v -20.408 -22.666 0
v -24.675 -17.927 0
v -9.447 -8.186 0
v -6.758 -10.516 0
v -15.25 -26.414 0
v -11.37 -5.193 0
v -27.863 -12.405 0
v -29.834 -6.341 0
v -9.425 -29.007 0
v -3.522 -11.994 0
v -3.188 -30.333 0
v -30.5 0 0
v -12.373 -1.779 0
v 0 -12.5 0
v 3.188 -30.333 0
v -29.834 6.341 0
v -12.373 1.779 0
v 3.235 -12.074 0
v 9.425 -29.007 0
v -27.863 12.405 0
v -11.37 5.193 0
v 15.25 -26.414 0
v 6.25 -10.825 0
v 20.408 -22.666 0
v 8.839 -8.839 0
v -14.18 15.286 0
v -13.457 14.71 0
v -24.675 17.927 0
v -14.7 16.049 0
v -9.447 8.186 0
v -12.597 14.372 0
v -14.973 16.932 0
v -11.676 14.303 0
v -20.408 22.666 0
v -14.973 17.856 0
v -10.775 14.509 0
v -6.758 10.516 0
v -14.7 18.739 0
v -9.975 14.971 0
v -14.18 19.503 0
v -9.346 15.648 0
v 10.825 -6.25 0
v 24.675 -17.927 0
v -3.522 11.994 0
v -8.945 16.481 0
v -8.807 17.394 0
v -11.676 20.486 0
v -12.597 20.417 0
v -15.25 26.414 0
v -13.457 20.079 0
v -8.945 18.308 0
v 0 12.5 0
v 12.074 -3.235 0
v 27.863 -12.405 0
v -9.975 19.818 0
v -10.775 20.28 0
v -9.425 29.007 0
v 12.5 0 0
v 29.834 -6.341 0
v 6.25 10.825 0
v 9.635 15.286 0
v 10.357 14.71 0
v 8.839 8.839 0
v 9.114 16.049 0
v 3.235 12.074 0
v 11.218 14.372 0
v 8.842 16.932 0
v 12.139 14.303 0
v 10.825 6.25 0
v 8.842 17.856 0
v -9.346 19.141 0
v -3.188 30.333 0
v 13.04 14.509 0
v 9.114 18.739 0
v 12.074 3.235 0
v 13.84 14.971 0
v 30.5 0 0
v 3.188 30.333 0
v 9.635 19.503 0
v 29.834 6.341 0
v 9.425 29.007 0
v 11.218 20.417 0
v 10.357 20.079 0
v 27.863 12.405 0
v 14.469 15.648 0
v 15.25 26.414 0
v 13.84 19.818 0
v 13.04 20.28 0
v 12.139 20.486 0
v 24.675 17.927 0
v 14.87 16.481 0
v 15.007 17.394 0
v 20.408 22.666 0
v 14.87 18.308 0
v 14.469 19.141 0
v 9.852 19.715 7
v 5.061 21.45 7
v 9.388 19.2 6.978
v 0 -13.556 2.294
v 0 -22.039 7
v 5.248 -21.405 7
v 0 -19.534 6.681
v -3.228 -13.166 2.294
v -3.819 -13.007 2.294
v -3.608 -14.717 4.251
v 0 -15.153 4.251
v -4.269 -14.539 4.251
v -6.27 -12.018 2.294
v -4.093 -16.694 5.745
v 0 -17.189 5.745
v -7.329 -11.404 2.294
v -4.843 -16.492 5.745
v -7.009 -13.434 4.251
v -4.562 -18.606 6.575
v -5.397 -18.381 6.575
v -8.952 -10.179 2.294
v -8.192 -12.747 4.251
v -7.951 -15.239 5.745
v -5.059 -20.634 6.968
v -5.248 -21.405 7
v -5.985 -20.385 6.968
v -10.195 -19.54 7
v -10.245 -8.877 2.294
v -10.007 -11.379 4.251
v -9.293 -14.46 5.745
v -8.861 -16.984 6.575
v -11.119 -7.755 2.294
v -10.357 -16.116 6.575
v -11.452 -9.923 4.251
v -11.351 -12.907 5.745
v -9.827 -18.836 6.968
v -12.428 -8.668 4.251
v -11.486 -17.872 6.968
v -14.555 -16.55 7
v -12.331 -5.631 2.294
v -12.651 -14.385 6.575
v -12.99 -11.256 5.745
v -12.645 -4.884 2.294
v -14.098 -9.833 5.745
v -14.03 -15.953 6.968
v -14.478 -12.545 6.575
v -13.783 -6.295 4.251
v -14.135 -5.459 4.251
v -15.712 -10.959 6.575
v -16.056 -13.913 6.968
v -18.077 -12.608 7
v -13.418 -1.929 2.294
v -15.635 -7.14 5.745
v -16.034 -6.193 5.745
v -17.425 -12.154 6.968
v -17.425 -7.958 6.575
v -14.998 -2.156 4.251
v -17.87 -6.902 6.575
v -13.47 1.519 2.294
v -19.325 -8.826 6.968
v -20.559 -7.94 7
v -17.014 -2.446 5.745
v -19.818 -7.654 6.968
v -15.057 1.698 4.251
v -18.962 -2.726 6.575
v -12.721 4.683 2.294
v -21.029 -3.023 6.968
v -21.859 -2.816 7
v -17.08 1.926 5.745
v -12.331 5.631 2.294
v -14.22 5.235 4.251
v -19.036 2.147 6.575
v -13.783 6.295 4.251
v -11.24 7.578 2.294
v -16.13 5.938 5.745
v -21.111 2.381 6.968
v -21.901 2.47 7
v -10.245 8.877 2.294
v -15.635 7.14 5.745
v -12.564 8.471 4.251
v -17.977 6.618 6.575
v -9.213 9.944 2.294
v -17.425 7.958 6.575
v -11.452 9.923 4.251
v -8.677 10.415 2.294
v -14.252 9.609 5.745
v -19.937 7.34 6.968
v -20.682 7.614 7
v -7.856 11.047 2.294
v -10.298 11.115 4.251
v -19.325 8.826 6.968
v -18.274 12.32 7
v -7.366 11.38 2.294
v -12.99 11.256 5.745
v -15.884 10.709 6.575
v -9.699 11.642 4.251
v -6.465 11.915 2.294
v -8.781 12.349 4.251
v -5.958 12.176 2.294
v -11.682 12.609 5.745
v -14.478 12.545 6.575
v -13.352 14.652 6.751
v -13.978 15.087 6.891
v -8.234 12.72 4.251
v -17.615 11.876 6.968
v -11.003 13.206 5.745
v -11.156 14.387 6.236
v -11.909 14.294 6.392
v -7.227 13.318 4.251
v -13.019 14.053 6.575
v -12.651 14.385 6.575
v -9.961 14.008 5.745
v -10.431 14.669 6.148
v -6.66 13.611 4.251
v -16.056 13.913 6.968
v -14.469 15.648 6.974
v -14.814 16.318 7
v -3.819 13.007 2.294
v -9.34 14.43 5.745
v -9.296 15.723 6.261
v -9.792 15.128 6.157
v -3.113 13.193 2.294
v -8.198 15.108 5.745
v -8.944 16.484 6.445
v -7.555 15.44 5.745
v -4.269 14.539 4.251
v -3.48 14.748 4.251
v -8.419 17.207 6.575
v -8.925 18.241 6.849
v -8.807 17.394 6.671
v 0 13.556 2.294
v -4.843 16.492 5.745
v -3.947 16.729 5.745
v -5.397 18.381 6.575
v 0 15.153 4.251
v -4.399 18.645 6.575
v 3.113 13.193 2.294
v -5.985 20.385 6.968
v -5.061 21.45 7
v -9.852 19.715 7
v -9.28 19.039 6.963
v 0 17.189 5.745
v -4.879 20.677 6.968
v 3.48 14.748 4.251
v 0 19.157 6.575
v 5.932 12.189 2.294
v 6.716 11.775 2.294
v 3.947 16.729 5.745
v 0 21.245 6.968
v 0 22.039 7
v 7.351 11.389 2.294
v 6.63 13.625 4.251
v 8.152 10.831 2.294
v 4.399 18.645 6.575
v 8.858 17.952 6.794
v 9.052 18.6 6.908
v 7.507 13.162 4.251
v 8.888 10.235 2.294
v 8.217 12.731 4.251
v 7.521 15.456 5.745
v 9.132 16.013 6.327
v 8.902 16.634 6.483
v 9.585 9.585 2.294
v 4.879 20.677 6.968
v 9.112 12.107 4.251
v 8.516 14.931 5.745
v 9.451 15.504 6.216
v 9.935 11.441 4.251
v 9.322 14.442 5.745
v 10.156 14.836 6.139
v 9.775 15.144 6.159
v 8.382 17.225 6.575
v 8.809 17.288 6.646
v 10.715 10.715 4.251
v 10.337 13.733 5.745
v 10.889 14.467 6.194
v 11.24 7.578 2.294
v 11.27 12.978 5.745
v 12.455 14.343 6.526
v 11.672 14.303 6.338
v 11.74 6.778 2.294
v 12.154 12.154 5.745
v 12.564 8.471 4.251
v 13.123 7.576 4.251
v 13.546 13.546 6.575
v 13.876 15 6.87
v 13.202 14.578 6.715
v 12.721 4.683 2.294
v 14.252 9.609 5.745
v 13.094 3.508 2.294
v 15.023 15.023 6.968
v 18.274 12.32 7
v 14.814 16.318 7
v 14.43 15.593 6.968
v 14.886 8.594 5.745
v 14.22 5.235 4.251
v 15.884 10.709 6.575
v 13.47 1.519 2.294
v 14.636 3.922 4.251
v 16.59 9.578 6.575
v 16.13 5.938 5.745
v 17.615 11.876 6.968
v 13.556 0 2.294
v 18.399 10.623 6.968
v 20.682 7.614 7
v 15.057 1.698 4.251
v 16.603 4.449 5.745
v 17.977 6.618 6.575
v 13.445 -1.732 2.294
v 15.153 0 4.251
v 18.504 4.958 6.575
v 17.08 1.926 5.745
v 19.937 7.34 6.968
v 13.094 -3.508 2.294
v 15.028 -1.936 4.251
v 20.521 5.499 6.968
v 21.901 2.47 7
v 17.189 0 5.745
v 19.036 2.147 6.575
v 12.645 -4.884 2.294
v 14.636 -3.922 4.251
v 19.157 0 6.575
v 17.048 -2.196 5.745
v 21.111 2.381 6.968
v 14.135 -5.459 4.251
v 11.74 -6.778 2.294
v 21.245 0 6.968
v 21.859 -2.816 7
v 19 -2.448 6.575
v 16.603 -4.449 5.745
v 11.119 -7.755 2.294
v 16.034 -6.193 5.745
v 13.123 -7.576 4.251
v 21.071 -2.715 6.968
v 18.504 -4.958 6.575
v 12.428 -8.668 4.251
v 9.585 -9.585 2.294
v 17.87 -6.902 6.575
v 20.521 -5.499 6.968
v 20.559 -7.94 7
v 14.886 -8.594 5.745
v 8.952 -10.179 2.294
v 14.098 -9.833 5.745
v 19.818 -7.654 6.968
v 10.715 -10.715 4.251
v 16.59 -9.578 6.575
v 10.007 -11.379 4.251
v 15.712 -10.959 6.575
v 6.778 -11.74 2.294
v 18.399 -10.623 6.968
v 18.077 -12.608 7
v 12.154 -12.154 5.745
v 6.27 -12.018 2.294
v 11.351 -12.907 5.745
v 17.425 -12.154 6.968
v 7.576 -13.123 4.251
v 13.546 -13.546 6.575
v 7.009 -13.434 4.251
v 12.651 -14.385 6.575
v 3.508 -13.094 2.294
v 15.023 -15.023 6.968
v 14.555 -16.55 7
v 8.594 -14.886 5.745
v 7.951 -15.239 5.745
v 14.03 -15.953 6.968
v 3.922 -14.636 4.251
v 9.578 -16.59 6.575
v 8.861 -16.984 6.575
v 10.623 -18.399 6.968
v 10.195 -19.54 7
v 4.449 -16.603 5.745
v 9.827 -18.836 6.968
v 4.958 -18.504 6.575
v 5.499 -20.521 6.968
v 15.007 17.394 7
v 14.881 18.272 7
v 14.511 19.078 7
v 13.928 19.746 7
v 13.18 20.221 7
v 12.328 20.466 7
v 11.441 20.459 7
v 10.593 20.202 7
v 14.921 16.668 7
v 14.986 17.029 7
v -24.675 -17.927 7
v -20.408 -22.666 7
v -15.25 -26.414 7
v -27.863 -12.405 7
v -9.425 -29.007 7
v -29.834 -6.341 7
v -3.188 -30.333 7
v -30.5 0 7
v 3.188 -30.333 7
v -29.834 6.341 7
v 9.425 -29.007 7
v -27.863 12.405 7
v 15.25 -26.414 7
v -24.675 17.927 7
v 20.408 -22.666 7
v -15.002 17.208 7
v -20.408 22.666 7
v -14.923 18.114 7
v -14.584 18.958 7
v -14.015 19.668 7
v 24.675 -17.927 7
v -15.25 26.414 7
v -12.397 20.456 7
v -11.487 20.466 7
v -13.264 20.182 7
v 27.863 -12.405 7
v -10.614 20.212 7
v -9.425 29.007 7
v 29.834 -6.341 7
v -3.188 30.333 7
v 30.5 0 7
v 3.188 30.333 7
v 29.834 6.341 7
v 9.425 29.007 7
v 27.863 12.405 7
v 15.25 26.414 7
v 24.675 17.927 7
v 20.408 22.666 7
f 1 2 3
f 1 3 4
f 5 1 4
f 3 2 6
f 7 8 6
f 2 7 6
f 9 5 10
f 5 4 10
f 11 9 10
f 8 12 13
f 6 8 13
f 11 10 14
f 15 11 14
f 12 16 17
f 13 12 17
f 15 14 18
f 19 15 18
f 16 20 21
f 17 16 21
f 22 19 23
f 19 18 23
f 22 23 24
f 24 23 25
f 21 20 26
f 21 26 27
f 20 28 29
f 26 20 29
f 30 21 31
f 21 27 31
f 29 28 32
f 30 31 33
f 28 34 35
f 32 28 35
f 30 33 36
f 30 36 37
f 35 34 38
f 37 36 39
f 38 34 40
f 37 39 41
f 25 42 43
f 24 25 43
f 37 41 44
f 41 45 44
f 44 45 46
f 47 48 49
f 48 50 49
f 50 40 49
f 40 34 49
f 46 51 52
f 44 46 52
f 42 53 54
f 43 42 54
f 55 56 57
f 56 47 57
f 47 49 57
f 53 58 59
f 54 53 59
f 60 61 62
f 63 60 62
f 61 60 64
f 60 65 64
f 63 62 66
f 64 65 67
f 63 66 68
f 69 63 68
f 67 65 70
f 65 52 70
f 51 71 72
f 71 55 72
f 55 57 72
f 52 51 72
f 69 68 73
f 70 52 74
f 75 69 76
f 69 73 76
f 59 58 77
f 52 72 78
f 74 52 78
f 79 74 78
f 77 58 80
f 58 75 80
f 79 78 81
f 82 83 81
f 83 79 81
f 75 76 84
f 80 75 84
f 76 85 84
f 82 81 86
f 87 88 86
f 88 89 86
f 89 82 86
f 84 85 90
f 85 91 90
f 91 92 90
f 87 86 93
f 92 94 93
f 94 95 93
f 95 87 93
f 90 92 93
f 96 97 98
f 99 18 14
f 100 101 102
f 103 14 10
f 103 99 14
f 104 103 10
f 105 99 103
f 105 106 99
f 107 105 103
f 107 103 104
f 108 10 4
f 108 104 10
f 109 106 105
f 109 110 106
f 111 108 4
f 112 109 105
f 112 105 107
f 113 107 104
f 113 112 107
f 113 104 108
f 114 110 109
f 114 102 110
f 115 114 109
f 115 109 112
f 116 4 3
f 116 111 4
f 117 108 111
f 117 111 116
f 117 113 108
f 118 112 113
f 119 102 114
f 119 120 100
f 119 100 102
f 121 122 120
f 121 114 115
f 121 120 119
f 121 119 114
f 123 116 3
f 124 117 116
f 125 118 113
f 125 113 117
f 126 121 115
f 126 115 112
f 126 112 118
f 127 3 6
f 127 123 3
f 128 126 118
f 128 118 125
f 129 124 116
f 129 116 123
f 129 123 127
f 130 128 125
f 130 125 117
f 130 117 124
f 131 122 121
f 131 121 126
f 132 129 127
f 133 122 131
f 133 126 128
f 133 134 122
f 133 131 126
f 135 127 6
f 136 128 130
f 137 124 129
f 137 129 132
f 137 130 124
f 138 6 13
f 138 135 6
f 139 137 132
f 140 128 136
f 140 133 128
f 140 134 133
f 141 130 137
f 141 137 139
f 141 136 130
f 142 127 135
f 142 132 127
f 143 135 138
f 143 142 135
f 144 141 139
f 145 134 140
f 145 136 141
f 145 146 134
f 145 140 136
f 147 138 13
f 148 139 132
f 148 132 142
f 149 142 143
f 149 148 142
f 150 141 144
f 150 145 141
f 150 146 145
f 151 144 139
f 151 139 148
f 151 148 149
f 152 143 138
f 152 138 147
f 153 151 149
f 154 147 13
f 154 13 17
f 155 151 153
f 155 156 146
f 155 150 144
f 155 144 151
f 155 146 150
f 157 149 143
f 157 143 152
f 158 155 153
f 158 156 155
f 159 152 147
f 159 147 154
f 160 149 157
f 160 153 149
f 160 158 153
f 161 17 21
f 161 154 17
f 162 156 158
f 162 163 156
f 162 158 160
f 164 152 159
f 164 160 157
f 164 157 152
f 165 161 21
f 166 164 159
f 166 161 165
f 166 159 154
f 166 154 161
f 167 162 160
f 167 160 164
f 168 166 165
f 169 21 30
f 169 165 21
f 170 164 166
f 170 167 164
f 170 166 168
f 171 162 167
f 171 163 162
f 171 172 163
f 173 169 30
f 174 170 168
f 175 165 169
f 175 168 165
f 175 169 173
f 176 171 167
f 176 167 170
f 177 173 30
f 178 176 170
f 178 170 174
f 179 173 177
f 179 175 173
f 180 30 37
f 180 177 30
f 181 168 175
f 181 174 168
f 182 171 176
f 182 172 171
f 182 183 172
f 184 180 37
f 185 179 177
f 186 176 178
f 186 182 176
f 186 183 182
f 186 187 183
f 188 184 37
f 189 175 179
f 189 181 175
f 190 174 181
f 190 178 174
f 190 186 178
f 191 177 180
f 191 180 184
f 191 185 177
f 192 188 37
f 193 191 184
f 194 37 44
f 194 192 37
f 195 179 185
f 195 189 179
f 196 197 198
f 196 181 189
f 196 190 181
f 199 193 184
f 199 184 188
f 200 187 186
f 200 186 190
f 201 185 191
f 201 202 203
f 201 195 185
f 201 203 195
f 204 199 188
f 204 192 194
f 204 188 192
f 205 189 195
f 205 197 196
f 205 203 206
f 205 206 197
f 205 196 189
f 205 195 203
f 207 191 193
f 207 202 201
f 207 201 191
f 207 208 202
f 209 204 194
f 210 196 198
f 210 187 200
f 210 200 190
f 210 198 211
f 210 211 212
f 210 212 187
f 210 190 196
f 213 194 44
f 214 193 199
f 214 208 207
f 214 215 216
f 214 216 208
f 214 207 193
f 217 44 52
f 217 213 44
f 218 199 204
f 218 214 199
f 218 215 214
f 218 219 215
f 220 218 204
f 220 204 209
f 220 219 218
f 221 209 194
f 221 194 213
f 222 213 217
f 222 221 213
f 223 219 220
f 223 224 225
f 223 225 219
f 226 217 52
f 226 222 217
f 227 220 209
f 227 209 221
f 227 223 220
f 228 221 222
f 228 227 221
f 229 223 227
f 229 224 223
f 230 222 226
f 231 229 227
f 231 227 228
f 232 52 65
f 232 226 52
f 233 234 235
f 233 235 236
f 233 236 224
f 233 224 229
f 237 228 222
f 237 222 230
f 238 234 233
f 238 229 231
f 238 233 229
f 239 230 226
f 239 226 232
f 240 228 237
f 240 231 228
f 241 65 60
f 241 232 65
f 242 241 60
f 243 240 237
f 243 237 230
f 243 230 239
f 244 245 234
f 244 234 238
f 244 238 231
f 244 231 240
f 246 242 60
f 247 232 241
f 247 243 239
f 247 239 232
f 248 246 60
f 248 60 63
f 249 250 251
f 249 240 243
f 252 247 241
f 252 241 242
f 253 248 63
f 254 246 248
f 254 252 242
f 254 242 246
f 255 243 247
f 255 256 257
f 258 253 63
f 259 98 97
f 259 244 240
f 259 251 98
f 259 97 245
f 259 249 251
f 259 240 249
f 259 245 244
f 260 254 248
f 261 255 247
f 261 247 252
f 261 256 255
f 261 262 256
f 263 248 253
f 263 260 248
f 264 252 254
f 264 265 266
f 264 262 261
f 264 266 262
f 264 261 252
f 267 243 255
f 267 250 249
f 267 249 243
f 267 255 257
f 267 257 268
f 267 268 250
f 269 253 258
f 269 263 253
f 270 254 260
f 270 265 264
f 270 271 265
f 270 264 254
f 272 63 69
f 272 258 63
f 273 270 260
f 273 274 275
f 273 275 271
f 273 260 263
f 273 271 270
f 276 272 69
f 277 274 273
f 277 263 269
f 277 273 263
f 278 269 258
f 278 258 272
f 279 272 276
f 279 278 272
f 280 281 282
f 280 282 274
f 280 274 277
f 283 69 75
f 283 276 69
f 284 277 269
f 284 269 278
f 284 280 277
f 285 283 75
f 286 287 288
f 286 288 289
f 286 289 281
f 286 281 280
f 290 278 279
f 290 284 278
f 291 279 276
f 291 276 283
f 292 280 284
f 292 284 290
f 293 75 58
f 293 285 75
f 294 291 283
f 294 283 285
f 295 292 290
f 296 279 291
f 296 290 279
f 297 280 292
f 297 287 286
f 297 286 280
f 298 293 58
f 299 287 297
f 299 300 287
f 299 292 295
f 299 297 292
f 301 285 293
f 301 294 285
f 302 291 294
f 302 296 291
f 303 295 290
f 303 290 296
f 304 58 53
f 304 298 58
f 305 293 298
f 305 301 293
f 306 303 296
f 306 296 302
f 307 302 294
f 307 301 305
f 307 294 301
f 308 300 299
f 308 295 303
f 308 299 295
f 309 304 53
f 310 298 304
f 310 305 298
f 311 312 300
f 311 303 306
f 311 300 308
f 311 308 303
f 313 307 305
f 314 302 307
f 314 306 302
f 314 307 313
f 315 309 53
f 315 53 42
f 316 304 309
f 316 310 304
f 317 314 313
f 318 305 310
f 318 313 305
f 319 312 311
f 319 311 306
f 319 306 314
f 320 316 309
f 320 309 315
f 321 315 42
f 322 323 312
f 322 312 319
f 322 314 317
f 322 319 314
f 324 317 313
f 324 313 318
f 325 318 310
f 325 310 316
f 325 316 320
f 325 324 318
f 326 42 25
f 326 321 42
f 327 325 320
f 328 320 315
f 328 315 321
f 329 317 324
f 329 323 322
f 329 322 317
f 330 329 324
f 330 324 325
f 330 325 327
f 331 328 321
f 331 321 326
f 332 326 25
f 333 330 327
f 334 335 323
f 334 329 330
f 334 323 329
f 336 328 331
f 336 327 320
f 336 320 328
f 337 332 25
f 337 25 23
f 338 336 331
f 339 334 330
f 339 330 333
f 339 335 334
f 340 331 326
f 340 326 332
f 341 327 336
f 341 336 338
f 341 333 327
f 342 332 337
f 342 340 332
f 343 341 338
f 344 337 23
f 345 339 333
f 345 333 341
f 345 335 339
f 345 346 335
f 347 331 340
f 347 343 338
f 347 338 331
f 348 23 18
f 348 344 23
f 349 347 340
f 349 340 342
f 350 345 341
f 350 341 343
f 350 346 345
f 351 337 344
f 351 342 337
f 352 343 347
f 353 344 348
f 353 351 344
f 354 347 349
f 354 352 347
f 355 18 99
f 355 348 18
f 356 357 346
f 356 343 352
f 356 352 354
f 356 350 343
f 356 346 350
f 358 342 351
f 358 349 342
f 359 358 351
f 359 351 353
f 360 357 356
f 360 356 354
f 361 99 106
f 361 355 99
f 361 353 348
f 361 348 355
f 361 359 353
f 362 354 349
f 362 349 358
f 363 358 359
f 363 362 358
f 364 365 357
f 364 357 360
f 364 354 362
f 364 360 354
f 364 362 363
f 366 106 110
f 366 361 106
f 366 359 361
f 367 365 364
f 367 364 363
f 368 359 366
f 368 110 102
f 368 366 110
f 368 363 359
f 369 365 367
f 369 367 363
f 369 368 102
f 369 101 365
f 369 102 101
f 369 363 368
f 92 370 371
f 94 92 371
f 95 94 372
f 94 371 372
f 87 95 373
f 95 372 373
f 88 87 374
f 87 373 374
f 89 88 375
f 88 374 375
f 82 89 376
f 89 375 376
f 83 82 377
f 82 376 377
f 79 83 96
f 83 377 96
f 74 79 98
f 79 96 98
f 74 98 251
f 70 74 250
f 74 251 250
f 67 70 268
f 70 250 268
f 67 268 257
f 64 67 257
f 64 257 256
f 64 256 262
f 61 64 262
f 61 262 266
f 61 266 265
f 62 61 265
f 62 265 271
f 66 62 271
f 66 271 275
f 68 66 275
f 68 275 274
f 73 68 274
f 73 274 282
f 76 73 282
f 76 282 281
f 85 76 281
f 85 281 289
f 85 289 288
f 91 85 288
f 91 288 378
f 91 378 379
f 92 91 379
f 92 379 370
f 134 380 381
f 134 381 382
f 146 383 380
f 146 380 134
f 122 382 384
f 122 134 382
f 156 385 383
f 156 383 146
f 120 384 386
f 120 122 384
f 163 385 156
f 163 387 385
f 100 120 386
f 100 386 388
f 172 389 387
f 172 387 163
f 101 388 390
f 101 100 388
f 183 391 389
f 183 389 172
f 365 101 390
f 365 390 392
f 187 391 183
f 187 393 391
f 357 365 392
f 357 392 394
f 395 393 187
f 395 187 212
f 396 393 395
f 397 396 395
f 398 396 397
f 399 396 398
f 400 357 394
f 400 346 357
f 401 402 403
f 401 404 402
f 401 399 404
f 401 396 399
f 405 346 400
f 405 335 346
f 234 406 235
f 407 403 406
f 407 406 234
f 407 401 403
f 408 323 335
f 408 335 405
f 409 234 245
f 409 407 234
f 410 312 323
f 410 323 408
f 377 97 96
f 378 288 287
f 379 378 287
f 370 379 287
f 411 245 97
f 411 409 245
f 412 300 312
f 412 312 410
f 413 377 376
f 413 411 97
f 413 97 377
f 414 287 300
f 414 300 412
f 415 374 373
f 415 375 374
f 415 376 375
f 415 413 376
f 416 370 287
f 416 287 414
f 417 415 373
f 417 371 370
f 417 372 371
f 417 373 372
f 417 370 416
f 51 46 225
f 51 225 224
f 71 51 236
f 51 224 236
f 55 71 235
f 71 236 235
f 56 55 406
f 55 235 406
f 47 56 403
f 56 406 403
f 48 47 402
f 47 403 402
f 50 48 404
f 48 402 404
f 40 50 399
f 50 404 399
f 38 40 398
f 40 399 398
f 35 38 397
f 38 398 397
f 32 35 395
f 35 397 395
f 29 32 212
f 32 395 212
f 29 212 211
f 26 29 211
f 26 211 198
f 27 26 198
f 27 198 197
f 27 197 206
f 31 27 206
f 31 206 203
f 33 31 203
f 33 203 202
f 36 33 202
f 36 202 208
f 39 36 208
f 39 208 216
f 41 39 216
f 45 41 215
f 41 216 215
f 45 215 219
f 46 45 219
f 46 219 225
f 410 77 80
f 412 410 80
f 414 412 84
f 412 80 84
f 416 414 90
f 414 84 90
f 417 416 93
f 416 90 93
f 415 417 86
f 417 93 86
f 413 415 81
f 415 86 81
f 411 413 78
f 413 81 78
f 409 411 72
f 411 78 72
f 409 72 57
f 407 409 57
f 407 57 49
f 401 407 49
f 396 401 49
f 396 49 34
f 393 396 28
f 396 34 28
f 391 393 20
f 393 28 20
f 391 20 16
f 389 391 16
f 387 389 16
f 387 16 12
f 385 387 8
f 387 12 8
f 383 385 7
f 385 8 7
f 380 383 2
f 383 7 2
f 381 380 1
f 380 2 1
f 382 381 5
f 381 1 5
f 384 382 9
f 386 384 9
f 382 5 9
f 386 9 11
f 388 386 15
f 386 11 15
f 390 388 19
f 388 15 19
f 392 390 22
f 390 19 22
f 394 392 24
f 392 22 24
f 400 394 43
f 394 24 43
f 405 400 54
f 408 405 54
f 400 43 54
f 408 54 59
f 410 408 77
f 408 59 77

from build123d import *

# Parameters (mm, degrees)
SKETCH1_R                        = 30.5
BOSS_EXTRUDE1_DEPTH              = 7
SKETCH2_R                        = 3.1
F_2X_6_2_MM_AND_25_MM_THRU_DEPTH = 44.697826033
F_10MM_FILET_R                   = 10


with BuildPart() as part:
    # Sketch1 → Boss-Extrude1 (new body)
    with BuildSketch(Plane(origin=(0, 0, 0), x_dir=(0, 1, 0), z_dir=(0, 0, 1))):
        with Locations(Location((0, 0, 0), (0, 0, 270))):
            Circle(SKETCH1_R)
    extrude(amount=BOSS_EXTRUDE1_DEPTH)

    # Sketch2 → 2x 6.2 mm and 25 mm thru (cut, through all)
    with BuildSketch(Plane.XY.offset(7)):
        with BuildLine():
            ThreePointArc((12.5, 0), (8.838834765, 8.838834765), (0, 12.5))
            Line((0, 12.5), (0, -12.5))
            ThreePointArc((0, -12.5), (8.838834765, -8.838834765), (12.5, 0))
        make_face()
        with BuildLine():
            Line((0, -12.5), (0, 12.5))
            ThreePointArc((0, 12.5), (-12.5, 0), (0, -12.5))
        make_face()
        with Locations((-11.907432919, 17.394401462)):
            Circle(SKETCH2_R)
        with Locations((11.907432919, 17.394401462)):
            Circle(SKETCH2_R)
    extrude(amount=-F_2X_6_2_MM_AND_25_MM_THRU_DEPTH, mode=Mode.SUBTRACT)

    # 10mm filet
    # the kernel refuses this fillet: 10 mm, written as the material it takes off along each edge
    with BuildSketch(Plane(origin=(0, 0, 7), x_dir=(0, -1, 0), z_dir=(1, 0, 0))) as f_10mm_filet_piece_1:
        with BuildLine():
            CenterArc((22.039392014, 10), F_10MM_FILET_R, 197.457603124, 72.542396876)
            Line((12.5, 7), (12.30921216, 6.94))
            ThreePointArc((12.30921216, 6.94), (12.3, 3.5), (12.3, 0))
            Line((12.3, 0), (12.5, -0.2))
            Line((12.5, -0.2), (22.039392014, -0.2))
            Line((22.039392014, -0.2), (22.039392014, 0))
        make_face()
    revolve(axis=Axis((0, 0, 7), (0, 0, -1)), mode=Mode.SUBTRACT)


solid = part.part
